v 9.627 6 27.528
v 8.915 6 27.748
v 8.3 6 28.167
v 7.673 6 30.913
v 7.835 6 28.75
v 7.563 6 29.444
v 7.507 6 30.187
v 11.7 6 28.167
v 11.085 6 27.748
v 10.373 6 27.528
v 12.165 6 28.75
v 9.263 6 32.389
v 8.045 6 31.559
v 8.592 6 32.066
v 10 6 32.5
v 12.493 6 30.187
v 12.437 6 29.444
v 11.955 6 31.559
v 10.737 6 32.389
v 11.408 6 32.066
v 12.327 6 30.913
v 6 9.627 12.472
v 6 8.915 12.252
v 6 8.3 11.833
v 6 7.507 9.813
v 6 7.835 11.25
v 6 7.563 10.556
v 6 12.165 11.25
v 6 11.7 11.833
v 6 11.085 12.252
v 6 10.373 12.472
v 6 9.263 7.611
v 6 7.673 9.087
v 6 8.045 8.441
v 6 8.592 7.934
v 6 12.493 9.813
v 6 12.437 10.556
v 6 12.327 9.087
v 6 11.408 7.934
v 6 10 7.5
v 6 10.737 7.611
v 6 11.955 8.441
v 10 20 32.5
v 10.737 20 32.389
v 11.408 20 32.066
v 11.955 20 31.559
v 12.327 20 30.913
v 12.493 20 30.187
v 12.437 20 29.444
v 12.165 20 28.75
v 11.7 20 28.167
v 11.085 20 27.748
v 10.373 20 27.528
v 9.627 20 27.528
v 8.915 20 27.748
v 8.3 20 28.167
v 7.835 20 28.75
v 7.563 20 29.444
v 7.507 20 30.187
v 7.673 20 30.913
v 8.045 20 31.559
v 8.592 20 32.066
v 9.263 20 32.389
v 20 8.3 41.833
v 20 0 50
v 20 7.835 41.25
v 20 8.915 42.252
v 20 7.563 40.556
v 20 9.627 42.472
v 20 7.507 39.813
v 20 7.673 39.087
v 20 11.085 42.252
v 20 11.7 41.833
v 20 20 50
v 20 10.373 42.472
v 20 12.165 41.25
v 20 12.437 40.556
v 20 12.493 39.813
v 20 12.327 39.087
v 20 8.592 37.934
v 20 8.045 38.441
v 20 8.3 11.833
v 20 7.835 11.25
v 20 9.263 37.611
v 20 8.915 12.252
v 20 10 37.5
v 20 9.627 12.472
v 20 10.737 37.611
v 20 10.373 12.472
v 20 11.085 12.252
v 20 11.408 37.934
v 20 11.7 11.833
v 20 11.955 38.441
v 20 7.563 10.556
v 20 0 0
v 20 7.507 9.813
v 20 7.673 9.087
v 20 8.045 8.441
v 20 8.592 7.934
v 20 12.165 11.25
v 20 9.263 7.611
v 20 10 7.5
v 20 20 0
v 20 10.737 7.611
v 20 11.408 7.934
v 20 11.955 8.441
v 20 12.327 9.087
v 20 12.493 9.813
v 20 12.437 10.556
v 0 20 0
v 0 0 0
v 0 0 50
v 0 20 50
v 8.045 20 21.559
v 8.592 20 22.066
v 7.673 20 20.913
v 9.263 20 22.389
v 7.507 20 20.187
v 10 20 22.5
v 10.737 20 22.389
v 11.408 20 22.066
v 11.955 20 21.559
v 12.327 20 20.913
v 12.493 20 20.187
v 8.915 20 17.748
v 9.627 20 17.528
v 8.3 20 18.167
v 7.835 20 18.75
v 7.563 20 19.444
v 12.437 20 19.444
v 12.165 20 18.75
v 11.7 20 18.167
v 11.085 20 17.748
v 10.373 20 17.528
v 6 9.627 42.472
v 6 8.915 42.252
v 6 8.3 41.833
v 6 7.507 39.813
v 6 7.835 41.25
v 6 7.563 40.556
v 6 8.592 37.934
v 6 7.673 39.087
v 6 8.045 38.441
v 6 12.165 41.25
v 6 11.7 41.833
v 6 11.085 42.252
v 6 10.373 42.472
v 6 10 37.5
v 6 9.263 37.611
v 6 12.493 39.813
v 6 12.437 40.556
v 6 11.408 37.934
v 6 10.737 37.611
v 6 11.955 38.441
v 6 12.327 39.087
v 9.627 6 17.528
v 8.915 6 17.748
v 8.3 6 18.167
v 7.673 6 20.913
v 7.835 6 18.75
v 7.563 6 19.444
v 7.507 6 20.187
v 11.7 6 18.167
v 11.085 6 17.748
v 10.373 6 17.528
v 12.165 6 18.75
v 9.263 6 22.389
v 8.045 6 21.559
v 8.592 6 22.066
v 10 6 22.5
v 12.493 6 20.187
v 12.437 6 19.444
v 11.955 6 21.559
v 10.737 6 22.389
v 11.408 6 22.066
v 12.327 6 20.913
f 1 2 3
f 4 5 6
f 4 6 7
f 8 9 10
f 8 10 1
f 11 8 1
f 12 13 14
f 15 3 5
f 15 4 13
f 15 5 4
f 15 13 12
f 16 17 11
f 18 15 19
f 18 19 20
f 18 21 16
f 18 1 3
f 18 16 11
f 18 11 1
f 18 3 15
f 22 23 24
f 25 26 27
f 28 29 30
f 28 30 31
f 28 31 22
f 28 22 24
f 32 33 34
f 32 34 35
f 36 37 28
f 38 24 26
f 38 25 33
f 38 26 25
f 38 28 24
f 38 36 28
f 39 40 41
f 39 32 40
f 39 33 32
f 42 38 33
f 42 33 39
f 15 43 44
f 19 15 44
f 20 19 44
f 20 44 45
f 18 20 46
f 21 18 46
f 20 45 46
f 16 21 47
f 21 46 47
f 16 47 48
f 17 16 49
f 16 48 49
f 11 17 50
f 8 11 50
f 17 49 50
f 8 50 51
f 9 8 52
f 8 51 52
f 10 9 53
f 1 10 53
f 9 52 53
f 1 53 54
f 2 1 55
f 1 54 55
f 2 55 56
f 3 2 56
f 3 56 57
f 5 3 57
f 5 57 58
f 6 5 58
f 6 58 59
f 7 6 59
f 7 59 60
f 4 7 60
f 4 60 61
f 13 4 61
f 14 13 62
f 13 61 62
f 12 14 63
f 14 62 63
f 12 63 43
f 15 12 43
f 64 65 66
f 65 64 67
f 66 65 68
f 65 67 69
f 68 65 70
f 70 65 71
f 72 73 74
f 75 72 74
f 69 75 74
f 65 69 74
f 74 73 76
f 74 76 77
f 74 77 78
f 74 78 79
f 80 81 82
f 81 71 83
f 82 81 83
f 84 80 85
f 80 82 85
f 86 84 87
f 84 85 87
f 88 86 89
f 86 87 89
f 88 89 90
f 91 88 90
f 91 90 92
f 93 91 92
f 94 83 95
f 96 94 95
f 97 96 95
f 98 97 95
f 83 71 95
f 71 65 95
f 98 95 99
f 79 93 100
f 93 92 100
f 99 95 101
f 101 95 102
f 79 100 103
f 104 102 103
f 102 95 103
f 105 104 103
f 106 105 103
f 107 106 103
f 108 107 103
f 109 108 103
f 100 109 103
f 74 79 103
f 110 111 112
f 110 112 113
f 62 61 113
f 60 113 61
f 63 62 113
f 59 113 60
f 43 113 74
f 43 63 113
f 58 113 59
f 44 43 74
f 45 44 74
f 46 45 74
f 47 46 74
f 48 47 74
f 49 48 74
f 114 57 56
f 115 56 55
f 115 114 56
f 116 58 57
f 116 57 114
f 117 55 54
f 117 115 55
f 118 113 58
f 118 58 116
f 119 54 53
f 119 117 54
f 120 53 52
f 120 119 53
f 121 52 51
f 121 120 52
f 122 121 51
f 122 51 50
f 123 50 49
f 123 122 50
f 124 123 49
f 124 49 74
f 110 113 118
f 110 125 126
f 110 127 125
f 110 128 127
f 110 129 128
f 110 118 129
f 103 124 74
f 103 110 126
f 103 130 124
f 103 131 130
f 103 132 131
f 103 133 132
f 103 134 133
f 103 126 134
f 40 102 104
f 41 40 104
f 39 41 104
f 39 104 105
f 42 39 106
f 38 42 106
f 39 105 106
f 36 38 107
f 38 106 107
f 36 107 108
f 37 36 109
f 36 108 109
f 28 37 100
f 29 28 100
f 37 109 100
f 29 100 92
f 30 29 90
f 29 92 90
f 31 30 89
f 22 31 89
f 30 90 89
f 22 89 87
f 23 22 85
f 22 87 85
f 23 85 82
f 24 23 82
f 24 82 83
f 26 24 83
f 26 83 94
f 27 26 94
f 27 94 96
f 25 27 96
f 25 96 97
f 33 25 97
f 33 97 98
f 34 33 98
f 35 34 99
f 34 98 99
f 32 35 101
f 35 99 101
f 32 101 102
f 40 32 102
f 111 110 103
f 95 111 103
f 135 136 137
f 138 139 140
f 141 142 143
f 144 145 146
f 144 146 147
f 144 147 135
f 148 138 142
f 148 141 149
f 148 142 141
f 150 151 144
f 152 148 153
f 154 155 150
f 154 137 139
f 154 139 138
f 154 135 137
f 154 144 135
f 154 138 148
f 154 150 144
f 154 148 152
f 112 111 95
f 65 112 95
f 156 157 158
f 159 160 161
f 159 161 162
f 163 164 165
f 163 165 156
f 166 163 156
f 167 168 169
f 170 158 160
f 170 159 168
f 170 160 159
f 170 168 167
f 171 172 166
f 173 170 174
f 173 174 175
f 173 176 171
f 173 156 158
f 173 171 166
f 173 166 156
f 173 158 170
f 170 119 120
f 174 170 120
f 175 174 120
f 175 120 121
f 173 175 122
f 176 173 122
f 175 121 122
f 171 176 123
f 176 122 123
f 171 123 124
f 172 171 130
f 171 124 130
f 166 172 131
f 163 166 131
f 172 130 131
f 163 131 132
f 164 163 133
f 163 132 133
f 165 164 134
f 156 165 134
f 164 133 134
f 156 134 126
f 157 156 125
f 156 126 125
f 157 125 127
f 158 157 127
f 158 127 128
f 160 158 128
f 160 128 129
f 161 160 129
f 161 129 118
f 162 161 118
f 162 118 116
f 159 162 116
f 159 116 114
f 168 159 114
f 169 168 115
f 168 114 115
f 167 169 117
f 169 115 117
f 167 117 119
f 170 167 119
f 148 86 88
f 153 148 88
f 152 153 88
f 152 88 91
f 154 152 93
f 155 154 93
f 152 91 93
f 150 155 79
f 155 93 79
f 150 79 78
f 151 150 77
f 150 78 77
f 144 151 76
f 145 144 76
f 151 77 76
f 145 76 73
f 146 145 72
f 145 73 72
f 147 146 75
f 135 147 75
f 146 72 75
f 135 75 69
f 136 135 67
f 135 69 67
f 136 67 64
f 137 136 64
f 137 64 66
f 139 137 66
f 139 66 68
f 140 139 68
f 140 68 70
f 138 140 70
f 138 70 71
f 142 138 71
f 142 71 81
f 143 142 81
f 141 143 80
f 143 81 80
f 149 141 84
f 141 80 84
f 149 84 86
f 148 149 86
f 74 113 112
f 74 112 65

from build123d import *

# Parameters (mm, degrees)
SKETCH_1_W          = 20
SKETCH_1_H          = 20
EXTRUDE_1_DEPTH     = 50
SKETCH_2_R          = 2.5
CUT_EXTRUDE_1_DEPTH = 14
SKETCH_3_R          = 2.5
CUT_EXTRUDE_2_DEPTH = 14


with BuildPart() as part:
    # 草图1 → 凸台-拉伸1 (new body)
    with BuildSketch(Plane.XY):
        with Locations((10, 10)):
            Rectangle(SKETCH_1_W, SKETCH_1_H)
    extrude(amount=EXTRUDE_1_DEPTH)

    # 草图2 → 切除-拉伸1 (cut)
    with BuildSketch(Plane(origin=(20, 0, 0), x_dir=(0, 0, -1), z_dir=(1, 0, 0))):
        with Locations((-10, 10)):
            Circle(SKETCH_2_R)
        with Locations((-40, 10)):
            Circle(SKETCH_2_R)
    extrude(amount=-CUT_EXTRUDE_1_DEPTH, mode=Mode.SUBTRACT)

    # 草图3 → 切除-拉伸2 (cut)
    with BuildSketch(Plane(origin=(0, 20, 0), x_dir=(1, 0, 0), z_dir=(0, 1, 0))):
        with Locations(Location((10, -20, 0), (0, 0, 270))):
            Circle(SKETCH_3_R)
        with Locations(Location((10, -30, 0), (0, 0, 270))):
            Circle(SKETCH_3_R)
    extrude(amount=-CUT_EXTRUDE_2_DEPTH, mode=Mode.SUBTRACT)


solid = part.part
